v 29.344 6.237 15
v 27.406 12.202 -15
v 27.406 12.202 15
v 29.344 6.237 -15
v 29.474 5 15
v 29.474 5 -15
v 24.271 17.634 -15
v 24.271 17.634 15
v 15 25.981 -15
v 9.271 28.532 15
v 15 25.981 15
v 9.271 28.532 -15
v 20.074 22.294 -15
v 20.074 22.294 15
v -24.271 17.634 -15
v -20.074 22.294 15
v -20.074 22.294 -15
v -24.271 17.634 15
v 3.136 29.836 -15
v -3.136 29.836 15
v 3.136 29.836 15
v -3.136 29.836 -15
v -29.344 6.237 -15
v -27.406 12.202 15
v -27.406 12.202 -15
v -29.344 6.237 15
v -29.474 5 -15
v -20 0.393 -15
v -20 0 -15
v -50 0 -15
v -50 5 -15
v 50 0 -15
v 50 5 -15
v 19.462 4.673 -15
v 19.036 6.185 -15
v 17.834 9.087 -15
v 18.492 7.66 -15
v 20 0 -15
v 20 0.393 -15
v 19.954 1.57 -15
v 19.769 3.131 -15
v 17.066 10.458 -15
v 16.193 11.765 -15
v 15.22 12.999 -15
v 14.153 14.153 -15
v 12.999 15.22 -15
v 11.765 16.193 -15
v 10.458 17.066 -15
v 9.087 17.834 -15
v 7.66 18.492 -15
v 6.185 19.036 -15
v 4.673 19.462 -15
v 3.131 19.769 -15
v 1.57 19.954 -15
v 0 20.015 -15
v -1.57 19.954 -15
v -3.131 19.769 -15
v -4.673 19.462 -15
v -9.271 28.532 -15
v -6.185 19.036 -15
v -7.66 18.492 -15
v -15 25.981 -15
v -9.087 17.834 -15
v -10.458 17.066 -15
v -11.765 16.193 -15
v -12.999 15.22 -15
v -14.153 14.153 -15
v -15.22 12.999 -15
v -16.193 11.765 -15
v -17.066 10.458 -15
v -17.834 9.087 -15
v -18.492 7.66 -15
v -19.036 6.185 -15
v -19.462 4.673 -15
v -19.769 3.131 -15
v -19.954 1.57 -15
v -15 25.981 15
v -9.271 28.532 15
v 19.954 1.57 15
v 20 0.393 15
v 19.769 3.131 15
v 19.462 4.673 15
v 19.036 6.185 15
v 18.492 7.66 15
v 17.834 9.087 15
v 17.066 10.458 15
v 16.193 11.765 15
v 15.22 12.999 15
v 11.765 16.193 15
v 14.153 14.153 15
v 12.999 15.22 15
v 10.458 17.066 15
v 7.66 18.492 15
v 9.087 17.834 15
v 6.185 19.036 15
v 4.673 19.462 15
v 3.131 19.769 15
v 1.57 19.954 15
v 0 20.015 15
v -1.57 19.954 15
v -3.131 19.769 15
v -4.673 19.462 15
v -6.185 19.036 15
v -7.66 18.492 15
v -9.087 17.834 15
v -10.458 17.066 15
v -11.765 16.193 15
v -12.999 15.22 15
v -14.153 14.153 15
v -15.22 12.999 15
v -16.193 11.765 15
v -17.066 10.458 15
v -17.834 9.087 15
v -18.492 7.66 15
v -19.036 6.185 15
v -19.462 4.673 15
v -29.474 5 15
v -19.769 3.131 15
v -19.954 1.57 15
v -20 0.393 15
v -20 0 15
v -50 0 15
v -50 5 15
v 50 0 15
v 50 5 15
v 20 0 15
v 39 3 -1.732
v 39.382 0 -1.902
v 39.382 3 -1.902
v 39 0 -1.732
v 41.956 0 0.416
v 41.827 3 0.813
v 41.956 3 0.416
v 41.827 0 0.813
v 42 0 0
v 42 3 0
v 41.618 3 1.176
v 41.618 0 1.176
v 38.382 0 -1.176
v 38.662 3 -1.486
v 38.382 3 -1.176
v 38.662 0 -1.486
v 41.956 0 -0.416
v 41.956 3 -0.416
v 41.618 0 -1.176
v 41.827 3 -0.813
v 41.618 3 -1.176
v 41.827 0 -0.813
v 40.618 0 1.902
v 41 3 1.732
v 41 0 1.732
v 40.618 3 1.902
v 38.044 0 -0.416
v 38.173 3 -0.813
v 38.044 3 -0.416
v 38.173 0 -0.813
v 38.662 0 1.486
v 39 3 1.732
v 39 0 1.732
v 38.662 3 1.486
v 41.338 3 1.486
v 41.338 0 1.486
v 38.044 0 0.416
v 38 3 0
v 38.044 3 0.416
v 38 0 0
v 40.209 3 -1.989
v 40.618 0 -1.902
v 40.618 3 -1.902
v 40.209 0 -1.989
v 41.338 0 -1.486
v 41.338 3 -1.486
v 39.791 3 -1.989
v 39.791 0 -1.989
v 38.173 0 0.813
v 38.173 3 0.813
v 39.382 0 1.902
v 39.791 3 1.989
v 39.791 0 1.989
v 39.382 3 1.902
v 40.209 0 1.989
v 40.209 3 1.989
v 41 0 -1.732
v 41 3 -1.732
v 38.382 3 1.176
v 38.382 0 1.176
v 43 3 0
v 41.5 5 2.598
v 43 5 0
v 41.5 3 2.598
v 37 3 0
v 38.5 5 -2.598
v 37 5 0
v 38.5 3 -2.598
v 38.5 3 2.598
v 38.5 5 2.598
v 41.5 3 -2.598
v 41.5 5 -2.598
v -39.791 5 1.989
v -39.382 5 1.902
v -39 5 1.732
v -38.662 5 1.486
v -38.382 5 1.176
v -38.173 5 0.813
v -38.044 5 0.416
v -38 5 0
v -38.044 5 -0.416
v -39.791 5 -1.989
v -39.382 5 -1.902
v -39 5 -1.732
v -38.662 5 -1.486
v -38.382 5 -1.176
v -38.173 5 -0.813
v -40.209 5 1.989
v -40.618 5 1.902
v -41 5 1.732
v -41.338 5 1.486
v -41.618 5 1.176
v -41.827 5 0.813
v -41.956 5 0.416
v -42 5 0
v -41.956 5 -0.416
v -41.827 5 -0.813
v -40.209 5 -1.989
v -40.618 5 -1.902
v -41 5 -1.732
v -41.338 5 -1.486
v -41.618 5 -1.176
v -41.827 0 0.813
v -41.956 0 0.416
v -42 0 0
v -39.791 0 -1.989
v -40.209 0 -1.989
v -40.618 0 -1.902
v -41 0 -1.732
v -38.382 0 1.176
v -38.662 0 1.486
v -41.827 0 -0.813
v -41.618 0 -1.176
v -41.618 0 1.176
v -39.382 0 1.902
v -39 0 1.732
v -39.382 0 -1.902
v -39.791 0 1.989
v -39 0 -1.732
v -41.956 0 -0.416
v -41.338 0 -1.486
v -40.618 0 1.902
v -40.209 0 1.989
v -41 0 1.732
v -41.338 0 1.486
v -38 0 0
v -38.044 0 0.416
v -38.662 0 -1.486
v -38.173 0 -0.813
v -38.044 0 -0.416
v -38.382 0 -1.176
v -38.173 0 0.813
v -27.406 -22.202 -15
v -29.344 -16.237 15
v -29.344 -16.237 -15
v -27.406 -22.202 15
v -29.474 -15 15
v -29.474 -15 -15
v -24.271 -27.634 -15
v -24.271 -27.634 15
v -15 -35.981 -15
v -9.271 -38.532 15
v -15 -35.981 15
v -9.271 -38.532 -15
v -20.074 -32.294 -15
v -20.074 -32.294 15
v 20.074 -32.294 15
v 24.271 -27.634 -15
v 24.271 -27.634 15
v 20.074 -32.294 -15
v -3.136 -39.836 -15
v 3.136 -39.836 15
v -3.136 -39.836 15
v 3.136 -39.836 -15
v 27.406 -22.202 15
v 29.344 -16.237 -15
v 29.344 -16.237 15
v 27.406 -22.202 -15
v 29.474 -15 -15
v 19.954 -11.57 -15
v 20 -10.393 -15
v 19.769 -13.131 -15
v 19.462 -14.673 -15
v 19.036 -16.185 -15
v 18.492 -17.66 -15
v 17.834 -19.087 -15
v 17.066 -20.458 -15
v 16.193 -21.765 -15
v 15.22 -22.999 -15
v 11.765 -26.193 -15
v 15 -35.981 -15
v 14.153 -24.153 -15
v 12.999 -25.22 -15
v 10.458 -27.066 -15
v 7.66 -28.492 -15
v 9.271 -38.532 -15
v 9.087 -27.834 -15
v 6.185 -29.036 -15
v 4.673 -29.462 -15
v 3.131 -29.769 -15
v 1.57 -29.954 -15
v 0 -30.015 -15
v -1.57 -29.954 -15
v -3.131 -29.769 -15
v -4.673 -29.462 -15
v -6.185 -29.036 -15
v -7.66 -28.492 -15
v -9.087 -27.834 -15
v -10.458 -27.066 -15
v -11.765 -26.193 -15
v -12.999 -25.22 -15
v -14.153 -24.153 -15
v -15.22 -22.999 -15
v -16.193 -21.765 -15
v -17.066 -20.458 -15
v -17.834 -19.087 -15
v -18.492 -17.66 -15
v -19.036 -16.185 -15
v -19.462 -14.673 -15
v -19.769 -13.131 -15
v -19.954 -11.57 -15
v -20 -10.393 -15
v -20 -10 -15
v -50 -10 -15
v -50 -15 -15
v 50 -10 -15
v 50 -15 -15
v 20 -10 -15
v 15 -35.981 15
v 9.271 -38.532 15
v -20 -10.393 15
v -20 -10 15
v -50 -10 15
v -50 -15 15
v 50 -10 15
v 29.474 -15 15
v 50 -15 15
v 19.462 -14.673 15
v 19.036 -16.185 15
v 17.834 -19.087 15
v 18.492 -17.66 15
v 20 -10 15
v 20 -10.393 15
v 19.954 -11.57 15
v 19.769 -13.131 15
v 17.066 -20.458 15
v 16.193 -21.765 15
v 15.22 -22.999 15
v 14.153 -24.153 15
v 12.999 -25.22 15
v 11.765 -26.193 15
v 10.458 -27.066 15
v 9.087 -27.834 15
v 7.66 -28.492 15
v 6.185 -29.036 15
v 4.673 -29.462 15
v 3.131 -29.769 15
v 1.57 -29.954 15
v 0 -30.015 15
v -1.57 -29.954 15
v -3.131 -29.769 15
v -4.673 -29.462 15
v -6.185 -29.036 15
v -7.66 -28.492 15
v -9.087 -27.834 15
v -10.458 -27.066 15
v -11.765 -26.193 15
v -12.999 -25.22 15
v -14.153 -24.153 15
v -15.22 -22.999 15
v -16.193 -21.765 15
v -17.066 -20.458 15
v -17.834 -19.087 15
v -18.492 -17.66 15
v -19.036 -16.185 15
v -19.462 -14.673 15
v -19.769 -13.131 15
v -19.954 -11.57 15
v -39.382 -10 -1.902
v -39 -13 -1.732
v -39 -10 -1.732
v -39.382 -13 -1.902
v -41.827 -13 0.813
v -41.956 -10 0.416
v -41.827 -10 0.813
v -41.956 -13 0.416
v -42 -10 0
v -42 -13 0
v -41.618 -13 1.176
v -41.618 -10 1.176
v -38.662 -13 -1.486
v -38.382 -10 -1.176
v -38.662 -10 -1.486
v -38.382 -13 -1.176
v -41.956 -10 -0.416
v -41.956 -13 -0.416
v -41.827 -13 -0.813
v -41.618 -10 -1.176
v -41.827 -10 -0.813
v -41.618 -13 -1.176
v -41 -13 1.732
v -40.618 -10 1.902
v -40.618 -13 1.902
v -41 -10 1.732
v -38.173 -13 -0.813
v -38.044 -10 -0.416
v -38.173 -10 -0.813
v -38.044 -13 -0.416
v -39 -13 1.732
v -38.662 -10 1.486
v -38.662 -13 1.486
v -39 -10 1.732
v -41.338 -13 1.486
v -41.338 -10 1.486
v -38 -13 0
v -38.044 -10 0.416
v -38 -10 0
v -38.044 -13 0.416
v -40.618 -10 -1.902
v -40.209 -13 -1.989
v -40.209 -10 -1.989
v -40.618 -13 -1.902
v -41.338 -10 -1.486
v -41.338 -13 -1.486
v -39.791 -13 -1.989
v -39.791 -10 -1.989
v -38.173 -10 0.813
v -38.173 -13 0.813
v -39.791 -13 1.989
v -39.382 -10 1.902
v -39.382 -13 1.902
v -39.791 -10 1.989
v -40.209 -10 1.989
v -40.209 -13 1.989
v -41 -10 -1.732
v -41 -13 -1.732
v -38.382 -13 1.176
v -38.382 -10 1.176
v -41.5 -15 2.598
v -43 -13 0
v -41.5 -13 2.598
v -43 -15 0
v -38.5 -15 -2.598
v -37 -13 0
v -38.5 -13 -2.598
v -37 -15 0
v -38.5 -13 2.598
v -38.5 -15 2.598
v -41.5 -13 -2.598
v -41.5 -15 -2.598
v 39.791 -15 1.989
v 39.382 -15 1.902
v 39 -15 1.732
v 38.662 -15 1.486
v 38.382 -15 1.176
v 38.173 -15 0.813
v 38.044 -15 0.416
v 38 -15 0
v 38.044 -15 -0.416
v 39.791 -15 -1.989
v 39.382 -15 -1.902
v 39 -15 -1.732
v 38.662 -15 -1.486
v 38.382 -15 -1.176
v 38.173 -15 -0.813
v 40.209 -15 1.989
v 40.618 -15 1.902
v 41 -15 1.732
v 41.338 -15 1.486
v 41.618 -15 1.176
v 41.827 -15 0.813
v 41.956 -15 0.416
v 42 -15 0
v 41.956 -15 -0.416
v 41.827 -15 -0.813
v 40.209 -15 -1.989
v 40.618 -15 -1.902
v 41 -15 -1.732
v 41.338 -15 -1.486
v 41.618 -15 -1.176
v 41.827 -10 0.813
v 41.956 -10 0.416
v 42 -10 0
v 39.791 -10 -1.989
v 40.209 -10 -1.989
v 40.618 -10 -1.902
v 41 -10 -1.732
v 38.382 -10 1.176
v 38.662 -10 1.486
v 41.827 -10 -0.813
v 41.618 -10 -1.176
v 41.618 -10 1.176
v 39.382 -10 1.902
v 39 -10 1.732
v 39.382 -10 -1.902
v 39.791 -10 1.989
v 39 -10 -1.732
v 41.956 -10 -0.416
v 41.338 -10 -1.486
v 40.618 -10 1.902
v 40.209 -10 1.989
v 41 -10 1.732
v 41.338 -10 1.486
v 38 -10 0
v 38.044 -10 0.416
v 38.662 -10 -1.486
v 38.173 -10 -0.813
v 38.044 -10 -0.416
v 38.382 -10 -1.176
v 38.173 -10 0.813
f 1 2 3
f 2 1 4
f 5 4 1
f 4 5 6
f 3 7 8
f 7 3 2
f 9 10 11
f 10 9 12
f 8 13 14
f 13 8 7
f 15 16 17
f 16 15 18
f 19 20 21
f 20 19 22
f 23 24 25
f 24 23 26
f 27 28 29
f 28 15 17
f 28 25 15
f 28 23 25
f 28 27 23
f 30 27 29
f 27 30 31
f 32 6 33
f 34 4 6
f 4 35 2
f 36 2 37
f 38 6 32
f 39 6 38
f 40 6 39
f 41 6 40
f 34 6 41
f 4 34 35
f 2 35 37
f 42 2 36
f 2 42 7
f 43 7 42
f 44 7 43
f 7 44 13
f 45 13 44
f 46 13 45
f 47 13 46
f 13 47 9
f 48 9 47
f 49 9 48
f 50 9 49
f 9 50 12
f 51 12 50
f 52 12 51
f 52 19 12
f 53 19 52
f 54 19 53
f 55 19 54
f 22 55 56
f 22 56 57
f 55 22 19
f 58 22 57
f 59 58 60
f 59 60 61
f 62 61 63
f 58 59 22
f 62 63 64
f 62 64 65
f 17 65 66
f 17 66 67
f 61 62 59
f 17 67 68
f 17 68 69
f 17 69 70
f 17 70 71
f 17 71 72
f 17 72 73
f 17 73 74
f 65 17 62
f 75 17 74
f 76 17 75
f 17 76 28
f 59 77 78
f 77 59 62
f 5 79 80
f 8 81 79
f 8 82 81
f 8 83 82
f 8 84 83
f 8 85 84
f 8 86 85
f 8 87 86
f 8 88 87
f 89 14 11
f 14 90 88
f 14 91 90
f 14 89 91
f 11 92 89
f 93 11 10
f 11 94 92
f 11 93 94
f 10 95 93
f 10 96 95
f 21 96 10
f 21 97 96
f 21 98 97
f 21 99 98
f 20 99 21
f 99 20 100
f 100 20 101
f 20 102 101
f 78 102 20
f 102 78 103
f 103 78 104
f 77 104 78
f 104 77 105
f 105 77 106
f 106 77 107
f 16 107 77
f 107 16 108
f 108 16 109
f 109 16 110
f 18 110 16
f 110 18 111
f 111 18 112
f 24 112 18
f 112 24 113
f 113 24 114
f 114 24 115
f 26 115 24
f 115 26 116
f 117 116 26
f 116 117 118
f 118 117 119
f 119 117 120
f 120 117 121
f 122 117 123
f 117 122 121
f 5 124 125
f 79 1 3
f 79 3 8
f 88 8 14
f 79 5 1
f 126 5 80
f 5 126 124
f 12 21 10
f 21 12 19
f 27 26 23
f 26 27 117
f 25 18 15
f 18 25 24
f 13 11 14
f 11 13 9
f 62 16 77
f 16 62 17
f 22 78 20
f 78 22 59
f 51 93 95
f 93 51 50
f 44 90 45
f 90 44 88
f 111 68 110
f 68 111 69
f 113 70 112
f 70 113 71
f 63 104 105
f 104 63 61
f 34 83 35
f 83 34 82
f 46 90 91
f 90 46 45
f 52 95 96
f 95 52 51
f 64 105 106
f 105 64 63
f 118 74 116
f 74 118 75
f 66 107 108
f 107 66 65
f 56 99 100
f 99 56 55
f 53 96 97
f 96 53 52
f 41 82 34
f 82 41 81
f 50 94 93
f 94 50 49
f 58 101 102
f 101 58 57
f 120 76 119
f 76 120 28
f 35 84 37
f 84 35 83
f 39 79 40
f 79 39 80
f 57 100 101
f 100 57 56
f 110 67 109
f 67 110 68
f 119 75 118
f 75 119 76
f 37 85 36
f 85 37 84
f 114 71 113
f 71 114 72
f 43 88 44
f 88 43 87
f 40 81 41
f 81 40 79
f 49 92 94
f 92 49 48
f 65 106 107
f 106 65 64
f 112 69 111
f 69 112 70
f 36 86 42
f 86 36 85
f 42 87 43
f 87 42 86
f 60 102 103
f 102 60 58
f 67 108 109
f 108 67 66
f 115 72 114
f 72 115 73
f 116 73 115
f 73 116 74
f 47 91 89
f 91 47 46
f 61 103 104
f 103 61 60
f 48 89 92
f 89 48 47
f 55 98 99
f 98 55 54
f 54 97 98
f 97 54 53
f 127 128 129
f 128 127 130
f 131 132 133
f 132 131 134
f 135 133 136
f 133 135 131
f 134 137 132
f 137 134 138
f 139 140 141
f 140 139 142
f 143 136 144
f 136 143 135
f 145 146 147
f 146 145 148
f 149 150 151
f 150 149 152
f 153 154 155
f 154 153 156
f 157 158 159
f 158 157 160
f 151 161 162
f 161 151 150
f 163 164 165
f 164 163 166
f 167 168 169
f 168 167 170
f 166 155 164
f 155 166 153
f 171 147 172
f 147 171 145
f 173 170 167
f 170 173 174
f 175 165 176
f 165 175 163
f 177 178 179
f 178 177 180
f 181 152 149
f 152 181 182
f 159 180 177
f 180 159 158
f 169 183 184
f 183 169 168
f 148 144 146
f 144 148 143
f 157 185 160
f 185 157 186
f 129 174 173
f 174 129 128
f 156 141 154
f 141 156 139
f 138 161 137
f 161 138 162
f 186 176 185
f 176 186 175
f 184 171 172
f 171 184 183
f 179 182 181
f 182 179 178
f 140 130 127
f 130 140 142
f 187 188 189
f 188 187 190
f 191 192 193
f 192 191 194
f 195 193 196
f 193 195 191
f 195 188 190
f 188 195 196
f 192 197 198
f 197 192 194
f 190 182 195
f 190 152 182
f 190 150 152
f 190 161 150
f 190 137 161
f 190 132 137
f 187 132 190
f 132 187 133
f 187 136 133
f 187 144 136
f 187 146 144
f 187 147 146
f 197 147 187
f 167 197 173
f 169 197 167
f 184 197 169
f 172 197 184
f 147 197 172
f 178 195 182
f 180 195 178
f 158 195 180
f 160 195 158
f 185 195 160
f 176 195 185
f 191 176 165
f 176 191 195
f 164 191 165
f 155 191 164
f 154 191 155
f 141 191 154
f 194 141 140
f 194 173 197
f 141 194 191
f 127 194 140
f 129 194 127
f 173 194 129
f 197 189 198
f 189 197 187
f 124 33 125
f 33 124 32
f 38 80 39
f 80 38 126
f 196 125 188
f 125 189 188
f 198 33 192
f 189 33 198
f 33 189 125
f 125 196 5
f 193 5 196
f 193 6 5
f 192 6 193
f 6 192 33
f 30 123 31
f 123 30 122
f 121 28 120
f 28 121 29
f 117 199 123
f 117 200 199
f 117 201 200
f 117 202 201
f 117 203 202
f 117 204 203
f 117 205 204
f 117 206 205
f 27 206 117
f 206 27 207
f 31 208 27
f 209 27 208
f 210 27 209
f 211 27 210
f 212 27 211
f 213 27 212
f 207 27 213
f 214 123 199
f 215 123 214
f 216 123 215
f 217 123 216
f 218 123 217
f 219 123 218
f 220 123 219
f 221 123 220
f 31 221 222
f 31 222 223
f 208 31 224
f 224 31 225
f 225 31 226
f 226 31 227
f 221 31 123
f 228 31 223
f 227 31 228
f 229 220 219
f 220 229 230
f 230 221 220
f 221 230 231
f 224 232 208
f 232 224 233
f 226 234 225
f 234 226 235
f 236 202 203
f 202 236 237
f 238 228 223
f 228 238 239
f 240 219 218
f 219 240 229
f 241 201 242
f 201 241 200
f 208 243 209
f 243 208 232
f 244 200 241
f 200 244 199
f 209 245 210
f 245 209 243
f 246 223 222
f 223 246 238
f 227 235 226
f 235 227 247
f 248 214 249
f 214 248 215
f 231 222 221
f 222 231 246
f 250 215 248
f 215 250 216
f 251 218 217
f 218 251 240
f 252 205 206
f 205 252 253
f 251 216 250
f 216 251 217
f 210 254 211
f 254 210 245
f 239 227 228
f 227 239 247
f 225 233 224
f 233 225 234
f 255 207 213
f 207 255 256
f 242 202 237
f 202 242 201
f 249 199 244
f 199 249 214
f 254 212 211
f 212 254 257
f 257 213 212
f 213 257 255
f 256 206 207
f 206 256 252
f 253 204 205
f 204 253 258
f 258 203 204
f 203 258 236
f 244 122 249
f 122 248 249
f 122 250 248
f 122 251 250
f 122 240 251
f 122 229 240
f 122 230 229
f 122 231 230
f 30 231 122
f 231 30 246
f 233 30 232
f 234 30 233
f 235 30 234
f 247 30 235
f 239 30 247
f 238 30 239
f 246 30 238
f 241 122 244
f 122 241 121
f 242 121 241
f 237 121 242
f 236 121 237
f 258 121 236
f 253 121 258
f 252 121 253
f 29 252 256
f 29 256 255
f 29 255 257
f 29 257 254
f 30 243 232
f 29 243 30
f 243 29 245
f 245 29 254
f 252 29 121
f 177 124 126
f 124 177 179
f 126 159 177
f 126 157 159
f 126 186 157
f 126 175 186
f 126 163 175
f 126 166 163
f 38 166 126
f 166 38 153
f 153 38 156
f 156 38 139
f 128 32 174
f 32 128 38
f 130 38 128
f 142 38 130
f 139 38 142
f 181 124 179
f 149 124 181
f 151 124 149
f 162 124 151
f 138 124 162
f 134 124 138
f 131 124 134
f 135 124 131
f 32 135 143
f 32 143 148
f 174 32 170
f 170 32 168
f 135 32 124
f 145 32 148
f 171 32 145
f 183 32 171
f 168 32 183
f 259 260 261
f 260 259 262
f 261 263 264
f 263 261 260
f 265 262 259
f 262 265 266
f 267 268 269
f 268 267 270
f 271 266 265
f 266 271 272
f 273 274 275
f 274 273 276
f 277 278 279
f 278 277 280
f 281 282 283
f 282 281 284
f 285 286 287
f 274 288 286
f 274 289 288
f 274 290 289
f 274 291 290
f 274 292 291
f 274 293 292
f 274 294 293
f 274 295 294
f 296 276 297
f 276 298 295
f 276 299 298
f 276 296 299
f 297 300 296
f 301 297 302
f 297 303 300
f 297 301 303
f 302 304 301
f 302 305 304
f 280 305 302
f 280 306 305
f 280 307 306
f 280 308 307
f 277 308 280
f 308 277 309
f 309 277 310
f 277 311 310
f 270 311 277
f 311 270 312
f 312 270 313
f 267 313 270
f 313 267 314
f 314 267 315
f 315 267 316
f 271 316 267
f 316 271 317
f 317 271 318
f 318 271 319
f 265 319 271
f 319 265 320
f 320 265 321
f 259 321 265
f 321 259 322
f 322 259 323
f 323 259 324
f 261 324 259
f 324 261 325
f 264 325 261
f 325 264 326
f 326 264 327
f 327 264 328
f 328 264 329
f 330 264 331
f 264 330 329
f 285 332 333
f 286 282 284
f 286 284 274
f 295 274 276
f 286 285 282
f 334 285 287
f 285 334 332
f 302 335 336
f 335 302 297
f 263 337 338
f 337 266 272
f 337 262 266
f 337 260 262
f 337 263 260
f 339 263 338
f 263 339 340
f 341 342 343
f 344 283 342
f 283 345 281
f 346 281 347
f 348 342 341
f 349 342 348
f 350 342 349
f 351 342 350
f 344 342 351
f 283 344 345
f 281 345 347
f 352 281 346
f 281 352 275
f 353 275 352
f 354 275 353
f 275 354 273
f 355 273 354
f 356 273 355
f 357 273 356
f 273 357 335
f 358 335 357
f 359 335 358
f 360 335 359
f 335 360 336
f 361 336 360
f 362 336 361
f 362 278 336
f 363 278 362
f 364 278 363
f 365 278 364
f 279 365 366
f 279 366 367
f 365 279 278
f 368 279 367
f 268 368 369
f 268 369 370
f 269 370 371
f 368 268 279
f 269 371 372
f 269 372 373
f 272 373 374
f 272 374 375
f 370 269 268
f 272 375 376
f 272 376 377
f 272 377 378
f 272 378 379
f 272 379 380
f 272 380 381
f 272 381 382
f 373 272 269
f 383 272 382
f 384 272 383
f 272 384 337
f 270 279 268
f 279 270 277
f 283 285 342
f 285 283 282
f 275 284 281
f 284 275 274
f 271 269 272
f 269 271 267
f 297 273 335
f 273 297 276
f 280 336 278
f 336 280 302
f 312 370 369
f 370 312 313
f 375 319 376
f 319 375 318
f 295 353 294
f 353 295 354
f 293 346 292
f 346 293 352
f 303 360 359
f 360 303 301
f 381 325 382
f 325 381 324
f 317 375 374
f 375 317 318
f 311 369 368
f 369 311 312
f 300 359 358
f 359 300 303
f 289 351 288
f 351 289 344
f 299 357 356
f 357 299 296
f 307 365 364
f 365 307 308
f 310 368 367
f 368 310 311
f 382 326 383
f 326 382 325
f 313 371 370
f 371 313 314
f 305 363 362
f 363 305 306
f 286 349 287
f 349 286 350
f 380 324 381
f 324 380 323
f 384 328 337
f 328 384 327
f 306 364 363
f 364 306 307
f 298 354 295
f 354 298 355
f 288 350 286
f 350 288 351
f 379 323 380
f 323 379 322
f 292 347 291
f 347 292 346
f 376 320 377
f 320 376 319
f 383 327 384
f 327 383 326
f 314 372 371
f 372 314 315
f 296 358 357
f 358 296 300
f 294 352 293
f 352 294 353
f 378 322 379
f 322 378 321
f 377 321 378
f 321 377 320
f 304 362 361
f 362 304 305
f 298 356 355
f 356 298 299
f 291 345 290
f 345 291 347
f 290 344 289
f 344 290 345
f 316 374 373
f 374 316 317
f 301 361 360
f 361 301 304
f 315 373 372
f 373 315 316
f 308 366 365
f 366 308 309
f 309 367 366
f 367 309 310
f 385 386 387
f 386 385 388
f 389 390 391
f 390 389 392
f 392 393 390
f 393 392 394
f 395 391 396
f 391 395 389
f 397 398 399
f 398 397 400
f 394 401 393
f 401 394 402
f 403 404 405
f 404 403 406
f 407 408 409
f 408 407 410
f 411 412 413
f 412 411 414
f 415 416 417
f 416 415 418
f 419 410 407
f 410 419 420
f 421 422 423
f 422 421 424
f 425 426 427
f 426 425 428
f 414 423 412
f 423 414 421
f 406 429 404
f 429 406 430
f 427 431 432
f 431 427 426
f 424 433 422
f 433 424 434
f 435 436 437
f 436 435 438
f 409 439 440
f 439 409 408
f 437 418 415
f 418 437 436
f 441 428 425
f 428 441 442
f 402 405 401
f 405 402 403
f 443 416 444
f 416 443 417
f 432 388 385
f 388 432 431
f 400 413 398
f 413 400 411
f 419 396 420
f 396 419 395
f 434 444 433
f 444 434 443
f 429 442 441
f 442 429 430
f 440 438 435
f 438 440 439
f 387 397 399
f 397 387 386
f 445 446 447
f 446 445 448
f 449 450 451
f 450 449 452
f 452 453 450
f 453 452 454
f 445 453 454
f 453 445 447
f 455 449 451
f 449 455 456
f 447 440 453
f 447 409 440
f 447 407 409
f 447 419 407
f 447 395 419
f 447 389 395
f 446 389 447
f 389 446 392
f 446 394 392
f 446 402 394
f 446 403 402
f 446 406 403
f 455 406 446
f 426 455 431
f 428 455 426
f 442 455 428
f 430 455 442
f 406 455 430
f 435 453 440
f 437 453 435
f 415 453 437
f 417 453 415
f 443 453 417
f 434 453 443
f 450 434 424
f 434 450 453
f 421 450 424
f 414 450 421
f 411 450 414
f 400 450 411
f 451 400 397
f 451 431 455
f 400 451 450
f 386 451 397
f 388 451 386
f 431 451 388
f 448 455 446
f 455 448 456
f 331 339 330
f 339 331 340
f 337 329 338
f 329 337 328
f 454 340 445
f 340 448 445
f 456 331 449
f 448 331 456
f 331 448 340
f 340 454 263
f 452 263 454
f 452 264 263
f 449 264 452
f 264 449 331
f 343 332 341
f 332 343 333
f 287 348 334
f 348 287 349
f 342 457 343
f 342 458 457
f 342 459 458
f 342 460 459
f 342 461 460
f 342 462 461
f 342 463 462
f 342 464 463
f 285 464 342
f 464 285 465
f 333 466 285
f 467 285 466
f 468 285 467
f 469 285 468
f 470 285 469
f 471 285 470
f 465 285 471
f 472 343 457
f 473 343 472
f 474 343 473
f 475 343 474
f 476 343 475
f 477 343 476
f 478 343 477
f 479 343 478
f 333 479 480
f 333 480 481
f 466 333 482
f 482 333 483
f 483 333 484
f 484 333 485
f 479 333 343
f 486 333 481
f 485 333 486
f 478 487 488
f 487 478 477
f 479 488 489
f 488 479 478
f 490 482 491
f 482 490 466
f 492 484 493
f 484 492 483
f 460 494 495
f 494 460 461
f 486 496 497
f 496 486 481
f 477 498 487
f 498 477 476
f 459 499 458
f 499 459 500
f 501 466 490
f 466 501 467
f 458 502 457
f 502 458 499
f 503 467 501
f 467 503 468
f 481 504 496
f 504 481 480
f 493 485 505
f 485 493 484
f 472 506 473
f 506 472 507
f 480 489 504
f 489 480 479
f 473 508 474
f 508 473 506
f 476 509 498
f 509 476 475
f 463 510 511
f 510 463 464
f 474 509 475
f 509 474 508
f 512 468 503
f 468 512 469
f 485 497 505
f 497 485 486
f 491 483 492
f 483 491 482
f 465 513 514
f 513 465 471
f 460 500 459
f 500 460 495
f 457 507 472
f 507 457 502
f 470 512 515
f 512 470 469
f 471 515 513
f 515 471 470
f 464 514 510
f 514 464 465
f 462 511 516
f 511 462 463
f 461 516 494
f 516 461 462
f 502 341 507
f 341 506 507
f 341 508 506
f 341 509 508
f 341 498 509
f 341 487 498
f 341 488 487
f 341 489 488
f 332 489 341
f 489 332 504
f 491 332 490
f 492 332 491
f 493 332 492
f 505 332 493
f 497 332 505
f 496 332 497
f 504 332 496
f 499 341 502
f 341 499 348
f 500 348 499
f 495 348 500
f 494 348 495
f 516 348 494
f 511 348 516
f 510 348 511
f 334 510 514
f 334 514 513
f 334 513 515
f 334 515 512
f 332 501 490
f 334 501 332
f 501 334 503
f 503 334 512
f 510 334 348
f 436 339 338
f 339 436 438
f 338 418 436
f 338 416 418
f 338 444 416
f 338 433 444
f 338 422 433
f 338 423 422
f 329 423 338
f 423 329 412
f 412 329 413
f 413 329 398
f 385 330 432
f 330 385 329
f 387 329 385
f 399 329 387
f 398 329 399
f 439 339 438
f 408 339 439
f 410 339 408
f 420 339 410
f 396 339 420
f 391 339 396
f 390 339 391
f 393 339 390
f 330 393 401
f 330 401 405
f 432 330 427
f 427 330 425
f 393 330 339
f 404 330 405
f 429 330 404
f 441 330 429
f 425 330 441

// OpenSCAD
// file: stuff.scad
bignumber=500;

module hole(h,d,r=false,center=false){
    r=(r==false)?(d/2):r;
    cylinder(h=h,r=r,center=center,$fs=0.2);
}
module polyhole(h,d,r=false,center=false){
    r=(r==false)?(d/2):r;
    n=max(round(4*r),3);
    rotate([0,0,180])cylinder(h=h,r=r/cos(180/n),$fn=n,center=center);
}
// main file
include <stuff.scad>;
diameter=40;
wall=10;
height=30;
flange=20;
module stoolmountbase(){
	difference(){
		hole(d=diameter+(wall*2),h=height,center=true);
		polyhole(d=diameter,h=height+1,center=true);
	}
	for(i=[0:1]) rotate([0,0,180*i])
	difference(){
		translate([diameter/2+flange/2+wall/2,0,0]) cube([flange+wall,wall,height],center=true);
		translate([diameter/2+flange/2+wall,0,0]) rotate([90,0,0]){
			hole(d=4,h=bignumber,center=true);
			if(i==0)
				mirror([0,0,1]) translate([0,0,wall/2-2]) cylinder(r=3,h=10,$fn=6);
		}
	}
}
module semistoolmountbase(){
	intersection(){
		stoolmountbase();
		translate([0,bignumber/2,0]) cube([bignumber,bignumber,bignumber],center=true);
	}
}
semistoolmountbase();
translate([0,-10,0]) rotate([0,0,180]) semistoolmountbase();
